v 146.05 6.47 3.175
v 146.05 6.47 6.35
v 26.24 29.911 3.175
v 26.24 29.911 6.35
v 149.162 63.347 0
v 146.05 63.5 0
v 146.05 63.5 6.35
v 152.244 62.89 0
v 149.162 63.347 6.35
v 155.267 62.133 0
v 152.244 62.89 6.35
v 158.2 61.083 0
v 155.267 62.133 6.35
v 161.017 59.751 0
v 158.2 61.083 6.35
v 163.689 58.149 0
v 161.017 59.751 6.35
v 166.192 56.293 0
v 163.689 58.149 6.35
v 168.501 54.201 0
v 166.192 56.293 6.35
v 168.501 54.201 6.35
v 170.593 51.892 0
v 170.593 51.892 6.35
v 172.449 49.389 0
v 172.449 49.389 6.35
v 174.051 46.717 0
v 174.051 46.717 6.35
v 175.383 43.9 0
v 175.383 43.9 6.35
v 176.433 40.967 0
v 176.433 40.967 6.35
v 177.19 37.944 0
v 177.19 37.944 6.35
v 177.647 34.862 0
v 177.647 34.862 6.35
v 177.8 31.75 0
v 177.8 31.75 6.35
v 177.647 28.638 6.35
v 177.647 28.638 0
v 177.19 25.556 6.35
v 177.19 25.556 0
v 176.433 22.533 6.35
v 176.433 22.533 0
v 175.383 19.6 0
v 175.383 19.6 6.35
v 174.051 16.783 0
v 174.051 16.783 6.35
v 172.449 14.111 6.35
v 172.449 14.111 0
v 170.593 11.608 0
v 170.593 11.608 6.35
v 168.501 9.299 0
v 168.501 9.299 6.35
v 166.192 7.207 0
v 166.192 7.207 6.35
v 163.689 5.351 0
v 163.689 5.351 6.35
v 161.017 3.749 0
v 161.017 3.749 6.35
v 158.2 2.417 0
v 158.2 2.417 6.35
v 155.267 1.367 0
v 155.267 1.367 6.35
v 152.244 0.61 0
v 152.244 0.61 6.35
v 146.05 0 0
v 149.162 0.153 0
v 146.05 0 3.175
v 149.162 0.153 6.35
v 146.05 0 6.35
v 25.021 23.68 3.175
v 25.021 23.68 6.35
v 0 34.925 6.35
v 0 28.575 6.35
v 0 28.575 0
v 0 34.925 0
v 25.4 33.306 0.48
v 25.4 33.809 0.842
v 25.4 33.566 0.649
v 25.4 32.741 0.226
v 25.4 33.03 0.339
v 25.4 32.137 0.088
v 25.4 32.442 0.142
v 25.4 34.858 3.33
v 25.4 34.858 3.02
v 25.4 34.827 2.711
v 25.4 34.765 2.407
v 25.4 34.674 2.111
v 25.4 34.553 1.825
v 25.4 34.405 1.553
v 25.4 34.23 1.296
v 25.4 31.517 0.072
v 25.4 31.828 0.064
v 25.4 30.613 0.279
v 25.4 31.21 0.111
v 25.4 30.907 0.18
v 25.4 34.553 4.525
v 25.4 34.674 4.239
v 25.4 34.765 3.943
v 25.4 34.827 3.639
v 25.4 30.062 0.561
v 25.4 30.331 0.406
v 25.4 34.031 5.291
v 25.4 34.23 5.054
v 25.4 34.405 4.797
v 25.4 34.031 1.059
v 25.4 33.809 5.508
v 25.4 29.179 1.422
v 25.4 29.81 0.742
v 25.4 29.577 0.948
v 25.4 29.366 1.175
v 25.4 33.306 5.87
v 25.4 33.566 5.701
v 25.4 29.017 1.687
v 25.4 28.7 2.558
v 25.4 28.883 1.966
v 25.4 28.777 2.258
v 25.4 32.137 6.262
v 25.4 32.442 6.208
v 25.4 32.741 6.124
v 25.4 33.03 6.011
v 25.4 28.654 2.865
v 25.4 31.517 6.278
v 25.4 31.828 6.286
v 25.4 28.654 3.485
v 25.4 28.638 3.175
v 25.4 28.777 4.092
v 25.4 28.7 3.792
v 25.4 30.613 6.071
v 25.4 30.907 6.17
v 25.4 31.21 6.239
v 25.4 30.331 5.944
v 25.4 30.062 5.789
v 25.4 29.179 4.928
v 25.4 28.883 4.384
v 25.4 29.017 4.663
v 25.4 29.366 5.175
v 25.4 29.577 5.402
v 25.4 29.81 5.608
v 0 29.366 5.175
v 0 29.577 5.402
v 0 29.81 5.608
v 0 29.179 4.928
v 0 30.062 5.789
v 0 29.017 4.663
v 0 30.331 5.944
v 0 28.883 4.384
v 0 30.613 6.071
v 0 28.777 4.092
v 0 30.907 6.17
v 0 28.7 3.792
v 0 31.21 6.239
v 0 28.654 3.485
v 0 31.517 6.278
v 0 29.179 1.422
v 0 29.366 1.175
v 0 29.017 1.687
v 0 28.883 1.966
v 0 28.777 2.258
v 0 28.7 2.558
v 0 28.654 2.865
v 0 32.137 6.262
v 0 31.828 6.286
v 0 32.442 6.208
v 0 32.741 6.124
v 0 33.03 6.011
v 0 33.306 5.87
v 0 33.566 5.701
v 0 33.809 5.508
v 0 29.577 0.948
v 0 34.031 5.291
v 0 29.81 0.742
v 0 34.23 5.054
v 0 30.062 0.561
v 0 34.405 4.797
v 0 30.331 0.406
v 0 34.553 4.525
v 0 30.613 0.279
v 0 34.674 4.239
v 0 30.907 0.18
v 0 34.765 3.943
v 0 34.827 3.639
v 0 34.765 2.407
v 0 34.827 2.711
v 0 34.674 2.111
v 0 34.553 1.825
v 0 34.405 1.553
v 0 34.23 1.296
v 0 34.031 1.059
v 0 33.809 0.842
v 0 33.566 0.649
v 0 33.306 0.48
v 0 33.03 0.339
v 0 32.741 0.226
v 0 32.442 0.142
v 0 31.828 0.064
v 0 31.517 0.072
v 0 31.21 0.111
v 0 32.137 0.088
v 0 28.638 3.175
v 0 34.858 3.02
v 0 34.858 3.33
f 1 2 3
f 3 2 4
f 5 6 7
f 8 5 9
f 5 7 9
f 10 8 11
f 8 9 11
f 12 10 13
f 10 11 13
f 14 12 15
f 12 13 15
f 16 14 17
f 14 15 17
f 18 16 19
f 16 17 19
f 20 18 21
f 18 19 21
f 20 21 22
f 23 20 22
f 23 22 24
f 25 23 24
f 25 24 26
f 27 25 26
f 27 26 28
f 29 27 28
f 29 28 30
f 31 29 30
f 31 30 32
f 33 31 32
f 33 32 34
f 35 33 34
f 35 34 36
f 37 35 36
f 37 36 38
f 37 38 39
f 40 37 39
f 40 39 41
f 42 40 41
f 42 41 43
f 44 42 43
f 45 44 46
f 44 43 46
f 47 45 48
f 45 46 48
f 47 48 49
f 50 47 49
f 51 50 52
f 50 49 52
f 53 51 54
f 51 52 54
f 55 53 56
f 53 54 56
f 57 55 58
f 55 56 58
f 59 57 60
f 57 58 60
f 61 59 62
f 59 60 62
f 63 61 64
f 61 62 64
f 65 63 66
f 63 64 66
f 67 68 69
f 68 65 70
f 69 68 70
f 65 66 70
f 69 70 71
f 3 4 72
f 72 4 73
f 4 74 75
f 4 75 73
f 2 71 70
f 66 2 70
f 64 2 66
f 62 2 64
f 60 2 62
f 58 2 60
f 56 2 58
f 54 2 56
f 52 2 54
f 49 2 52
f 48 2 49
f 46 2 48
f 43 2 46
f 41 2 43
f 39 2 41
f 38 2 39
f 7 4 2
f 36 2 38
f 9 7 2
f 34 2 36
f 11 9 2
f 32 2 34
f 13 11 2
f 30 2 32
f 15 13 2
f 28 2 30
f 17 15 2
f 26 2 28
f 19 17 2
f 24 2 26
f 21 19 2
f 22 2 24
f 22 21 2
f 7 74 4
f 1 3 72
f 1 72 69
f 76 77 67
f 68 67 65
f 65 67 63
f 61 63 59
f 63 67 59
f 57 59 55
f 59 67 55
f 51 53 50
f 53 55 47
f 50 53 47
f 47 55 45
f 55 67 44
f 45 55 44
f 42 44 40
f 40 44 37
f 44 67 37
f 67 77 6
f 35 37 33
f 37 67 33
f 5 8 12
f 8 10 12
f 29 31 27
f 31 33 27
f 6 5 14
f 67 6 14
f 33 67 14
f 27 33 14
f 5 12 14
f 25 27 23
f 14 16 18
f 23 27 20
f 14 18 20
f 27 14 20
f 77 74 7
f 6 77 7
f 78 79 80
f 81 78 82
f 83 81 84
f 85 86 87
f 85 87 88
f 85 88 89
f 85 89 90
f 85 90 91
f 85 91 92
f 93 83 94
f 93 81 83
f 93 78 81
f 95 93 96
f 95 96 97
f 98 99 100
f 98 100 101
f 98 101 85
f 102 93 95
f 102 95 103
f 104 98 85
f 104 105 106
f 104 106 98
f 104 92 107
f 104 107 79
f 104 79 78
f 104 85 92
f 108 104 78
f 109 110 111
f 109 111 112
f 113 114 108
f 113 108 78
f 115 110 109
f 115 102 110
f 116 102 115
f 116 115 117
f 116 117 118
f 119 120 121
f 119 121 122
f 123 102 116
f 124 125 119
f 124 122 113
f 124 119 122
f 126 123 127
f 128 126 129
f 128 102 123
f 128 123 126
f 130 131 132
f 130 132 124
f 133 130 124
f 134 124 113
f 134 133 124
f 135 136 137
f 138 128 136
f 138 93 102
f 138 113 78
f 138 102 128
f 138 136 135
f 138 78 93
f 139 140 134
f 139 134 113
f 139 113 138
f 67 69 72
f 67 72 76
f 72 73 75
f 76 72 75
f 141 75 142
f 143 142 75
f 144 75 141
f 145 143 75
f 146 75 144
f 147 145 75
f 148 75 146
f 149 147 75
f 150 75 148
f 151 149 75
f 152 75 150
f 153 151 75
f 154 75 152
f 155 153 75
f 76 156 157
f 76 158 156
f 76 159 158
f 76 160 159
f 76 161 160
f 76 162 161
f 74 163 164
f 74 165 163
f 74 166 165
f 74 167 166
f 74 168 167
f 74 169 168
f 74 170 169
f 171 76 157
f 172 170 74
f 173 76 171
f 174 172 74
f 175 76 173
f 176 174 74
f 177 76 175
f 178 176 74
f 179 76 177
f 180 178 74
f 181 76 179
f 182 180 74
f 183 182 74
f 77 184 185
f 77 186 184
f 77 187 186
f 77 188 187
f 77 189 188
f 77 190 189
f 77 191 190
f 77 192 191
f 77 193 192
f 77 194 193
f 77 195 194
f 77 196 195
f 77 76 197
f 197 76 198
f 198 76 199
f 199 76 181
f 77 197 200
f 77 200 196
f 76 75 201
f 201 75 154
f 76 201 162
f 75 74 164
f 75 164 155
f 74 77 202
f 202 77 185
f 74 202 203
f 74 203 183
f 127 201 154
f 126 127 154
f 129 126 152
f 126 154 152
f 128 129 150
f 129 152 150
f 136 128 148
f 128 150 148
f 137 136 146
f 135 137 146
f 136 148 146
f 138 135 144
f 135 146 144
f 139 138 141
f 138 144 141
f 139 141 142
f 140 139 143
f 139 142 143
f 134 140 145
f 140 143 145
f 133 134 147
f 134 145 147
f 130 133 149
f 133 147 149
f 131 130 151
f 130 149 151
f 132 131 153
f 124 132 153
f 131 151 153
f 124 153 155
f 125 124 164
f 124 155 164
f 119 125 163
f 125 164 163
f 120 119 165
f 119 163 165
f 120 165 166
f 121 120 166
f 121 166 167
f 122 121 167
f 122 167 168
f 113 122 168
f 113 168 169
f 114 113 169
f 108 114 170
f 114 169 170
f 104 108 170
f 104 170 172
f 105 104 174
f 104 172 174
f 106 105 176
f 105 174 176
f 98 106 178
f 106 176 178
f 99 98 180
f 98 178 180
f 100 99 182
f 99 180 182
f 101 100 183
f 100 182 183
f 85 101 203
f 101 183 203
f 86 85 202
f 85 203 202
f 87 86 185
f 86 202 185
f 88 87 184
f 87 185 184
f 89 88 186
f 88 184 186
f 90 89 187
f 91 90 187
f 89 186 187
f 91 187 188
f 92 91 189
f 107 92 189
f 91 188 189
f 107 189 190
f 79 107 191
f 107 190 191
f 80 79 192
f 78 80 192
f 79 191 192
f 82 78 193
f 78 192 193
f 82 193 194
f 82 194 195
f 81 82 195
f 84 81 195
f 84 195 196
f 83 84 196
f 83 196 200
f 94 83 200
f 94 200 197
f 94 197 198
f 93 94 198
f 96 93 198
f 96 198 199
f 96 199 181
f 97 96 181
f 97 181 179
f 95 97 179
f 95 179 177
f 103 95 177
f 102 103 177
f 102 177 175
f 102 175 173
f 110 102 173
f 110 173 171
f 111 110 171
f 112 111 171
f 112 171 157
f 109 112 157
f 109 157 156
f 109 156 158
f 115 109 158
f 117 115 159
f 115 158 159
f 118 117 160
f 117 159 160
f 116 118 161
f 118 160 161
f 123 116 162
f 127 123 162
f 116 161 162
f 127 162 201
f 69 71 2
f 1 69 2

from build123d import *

# Parameters (mm, degrees)
F0_W     = 177.8
F0_H     = 63.5
F1_DEPTH = 6.35
F3_DEPTH = 25.4
F5_DEPTH = 25.4
F6_R     = 3.1115
F7_DEPTH = 25.4
F9_DEPTH = 3.175


# Not quite as in the source:
# - ends of sketch curves that miss each other by under 0.0002 mm in the source are joined


with BuildPart() as f1:
    # F0 (on Top) → F1 (new body)
    with BuildSketch(Plane.XY):
        with Locations((88.9, 31.75)):
            Rectangle(F0_W, F0_H)
    extrude(amount=F1_DEPTH)

    # F2 (on face) → F3 (cut)
    with BuildSketch(Plane.XY.offset(6.35)):
        with BuildLine():
            ThreePointArc((146.05, 63.5), (168.5006403027, 54.2006403027), (177.8, 31.75))
            Line((177.8, 31.75), (177.8, 63.5))
            Line((177.8, 63.5), (146.05, 63.5))
        make_face()
        with BuildLine():
            ThreePointArc((177.8, 31.75), (168.5006402649, 9.2993596596), (146.0499998933, 0))
            Line((146.0499998933, 0), (177.8, 0))
            Line((177.8, 0), (177.8, 31.75))
        make_face()
    extrude(amount=-F3_DEPTH, mode=Mode.SUBTRACT)

    # F4 (on face) → F5 (cut)
    with BuildSketch(Plane.XY.offset(6.35)):
        Polygon((0, 34.925), (146.05, 63.5), (0, 63.5), align=None)
        Polygon((0, 0), (146.0499998933, 0), (0, 28.575), align=None)
    extrude(amount=-F5_DEPTH, mode=Mode.SUBTRACT)

    # F6 (on face) → F7 (cut)
    with BuildSketch(Plane(origin=(0, 0, 0), x_dir=(0, -1, 0), z_dir=(-1, 0, 0))):
        with Locations((-31.75, 3.175)):
            Circle(F6_R)
    extrude(amount=-F7_DEPTH, mode=Mode.SUBTRACT)

    # F8 (on face) → F9 (cut)
    with BuildSketch(Plane.XY.offset(6.35)):
        Polygon((26.2400177438, 29.9114803934), (25.0207440433, 23.679637035), (146.05, 0), (146.05, 6.4703969085), align=None)
    extrude(amount=-F9_DEPTH, mode=Mode.SUBTRACT)


solid = f1.part
